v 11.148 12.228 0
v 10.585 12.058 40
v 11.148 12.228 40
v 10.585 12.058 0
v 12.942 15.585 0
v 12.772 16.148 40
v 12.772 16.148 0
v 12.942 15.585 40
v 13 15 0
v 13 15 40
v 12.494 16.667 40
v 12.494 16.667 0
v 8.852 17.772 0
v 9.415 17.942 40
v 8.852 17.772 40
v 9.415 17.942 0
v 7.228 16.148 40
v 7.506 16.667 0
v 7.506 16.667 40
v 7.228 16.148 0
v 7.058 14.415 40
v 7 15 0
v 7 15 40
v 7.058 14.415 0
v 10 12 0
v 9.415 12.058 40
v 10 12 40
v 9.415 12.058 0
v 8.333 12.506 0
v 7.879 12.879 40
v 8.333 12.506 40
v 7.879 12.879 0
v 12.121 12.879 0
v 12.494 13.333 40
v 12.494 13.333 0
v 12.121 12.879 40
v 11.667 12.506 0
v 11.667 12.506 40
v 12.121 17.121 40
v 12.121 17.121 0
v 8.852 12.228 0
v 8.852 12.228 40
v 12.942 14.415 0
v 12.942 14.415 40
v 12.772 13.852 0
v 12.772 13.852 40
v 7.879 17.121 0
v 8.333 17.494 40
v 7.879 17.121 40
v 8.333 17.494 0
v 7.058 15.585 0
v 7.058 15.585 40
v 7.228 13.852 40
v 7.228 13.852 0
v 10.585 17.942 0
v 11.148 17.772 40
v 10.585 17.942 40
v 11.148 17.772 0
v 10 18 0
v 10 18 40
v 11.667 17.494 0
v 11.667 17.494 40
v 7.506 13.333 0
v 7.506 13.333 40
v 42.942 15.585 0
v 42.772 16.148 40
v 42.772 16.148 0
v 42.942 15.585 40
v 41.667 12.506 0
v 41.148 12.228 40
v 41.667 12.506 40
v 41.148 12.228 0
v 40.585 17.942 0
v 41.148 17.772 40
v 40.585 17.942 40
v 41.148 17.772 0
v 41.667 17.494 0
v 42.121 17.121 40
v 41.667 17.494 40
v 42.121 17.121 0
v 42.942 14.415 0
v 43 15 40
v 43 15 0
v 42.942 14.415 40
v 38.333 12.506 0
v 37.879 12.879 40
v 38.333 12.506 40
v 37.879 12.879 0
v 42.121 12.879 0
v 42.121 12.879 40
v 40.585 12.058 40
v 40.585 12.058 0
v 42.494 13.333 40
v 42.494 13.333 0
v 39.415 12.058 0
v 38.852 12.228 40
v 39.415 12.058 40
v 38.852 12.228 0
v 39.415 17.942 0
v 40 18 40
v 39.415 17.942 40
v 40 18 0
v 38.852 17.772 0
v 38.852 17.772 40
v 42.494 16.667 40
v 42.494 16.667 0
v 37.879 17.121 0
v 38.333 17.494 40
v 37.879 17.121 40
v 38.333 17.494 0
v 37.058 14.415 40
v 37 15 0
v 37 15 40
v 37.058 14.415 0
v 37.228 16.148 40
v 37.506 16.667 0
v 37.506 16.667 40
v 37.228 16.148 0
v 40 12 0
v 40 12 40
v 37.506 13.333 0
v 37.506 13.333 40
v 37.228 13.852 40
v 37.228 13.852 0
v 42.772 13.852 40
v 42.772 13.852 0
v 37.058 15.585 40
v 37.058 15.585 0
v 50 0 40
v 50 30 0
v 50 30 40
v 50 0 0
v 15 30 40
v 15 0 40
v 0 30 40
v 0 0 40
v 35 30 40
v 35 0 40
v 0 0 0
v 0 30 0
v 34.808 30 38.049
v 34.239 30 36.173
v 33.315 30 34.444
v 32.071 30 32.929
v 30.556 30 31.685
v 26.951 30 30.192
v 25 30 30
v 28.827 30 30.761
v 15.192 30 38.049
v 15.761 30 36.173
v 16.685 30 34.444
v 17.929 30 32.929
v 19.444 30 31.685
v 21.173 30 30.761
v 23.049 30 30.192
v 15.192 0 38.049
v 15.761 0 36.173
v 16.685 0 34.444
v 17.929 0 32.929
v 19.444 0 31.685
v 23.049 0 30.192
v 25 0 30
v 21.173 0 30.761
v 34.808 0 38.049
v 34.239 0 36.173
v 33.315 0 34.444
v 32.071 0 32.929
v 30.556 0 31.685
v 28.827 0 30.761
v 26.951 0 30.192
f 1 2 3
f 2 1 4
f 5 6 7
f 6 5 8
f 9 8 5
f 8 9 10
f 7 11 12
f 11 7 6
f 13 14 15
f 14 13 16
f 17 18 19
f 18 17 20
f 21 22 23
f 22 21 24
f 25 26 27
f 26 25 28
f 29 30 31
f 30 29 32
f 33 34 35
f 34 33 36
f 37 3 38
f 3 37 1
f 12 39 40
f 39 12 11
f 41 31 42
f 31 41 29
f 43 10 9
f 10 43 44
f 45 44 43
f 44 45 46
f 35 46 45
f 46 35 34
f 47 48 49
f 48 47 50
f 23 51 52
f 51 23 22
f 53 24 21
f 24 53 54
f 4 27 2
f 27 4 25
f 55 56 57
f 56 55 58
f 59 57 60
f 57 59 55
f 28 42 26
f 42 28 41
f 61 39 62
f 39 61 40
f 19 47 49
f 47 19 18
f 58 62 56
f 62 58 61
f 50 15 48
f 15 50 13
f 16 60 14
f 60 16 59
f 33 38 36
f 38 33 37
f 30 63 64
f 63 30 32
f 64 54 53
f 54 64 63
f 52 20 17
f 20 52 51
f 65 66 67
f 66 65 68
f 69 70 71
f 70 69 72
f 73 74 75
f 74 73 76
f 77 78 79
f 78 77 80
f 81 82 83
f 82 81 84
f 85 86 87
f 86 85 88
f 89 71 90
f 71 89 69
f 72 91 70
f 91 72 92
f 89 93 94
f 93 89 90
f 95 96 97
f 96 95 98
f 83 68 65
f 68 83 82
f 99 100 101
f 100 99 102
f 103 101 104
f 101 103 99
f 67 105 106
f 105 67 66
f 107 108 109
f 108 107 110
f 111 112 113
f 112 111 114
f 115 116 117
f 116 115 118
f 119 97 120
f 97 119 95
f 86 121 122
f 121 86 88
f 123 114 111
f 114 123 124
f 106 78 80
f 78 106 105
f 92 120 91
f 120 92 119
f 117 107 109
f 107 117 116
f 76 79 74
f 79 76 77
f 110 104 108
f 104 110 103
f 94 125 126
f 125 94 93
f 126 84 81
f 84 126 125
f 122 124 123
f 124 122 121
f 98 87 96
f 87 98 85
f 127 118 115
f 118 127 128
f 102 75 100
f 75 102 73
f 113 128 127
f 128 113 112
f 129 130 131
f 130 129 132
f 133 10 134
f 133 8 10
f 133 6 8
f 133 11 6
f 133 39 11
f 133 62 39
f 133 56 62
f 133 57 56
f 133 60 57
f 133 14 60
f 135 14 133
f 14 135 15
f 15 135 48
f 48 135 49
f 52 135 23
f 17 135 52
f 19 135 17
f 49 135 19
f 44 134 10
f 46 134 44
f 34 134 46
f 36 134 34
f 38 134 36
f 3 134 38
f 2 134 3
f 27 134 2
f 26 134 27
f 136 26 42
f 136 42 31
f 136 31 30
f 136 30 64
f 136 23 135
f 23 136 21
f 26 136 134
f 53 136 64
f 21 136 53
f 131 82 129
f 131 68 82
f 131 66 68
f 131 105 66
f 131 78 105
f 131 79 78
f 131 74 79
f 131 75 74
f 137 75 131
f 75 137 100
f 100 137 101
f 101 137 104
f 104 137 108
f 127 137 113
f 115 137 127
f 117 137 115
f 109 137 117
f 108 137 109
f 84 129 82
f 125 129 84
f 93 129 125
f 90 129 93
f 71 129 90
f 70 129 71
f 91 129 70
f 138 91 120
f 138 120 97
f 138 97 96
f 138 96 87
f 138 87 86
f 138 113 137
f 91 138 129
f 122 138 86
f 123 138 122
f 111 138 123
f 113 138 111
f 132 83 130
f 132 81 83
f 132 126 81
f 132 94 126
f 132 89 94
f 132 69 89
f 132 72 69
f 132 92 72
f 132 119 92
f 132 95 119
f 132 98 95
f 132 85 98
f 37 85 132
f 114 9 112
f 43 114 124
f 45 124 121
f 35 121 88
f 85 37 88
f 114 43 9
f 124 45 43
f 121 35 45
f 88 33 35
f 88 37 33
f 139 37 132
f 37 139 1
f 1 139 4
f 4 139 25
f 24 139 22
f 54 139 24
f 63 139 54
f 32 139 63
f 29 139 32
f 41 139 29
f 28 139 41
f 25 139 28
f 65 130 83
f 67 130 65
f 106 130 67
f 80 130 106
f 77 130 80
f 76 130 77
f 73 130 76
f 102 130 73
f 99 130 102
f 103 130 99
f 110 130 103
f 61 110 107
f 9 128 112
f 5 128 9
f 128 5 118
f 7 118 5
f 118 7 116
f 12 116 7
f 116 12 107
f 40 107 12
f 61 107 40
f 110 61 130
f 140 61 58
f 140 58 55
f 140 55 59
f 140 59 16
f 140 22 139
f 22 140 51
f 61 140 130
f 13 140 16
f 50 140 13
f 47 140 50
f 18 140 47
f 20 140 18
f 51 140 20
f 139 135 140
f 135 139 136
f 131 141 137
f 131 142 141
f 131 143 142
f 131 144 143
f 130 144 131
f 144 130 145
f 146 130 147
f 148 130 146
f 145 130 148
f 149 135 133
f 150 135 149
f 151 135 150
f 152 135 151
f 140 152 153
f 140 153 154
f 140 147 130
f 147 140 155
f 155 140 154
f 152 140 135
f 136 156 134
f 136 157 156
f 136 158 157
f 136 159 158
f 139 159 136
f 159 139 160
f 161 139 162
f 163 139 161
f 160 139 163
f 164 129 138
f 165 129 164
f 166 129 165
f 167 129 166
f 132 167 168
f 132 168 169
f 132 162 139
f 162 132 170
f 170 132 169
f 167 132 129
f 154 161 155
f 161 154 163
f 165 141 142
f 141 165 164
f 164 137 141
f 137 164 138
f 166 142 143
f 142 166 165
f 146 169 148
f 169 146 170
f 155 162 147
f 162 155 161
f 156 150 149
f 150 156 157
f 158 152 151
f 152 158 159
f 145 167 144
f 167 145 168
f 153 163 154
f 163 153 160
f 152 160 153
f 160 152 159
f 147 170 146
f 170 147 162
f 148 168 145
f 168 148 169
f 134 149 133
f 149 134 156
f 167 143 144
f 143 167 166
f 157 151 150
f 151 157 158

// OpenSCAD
$fn = 32;

// ----------------------------------------------------------------------
// Saddle clamp: plain shaft clamp
// ----------------------------------------------------------------------

// --- parameters (mm) ---
blk_l = 50;               // block length, X
blk_w = 30;               // block width, Y
blk_h = 40;               // block height
clamp_r = 10;             // shaft groove radius
hole_r = 3;               // bolt hole radius
hole_m = 10;              // bolt hole margin from the ends

saw_depth = clamp_r + 3;  // saw kerf depth

difference() {
  cube([blk_l, blk_w, blk_h]);
  translate([blk_l / 2, -1, blk_h])
    rotate([-90, 0, 0])
      cylinder(h = blk_w + 2, r = clamp_r);
  for (sx = [0, 1])
    translate([sx ? blk_l - hole_m : hole_m, blk_w / 2, -1])
      cylinder(r = hole_r, h = blk_h + 2);
}
